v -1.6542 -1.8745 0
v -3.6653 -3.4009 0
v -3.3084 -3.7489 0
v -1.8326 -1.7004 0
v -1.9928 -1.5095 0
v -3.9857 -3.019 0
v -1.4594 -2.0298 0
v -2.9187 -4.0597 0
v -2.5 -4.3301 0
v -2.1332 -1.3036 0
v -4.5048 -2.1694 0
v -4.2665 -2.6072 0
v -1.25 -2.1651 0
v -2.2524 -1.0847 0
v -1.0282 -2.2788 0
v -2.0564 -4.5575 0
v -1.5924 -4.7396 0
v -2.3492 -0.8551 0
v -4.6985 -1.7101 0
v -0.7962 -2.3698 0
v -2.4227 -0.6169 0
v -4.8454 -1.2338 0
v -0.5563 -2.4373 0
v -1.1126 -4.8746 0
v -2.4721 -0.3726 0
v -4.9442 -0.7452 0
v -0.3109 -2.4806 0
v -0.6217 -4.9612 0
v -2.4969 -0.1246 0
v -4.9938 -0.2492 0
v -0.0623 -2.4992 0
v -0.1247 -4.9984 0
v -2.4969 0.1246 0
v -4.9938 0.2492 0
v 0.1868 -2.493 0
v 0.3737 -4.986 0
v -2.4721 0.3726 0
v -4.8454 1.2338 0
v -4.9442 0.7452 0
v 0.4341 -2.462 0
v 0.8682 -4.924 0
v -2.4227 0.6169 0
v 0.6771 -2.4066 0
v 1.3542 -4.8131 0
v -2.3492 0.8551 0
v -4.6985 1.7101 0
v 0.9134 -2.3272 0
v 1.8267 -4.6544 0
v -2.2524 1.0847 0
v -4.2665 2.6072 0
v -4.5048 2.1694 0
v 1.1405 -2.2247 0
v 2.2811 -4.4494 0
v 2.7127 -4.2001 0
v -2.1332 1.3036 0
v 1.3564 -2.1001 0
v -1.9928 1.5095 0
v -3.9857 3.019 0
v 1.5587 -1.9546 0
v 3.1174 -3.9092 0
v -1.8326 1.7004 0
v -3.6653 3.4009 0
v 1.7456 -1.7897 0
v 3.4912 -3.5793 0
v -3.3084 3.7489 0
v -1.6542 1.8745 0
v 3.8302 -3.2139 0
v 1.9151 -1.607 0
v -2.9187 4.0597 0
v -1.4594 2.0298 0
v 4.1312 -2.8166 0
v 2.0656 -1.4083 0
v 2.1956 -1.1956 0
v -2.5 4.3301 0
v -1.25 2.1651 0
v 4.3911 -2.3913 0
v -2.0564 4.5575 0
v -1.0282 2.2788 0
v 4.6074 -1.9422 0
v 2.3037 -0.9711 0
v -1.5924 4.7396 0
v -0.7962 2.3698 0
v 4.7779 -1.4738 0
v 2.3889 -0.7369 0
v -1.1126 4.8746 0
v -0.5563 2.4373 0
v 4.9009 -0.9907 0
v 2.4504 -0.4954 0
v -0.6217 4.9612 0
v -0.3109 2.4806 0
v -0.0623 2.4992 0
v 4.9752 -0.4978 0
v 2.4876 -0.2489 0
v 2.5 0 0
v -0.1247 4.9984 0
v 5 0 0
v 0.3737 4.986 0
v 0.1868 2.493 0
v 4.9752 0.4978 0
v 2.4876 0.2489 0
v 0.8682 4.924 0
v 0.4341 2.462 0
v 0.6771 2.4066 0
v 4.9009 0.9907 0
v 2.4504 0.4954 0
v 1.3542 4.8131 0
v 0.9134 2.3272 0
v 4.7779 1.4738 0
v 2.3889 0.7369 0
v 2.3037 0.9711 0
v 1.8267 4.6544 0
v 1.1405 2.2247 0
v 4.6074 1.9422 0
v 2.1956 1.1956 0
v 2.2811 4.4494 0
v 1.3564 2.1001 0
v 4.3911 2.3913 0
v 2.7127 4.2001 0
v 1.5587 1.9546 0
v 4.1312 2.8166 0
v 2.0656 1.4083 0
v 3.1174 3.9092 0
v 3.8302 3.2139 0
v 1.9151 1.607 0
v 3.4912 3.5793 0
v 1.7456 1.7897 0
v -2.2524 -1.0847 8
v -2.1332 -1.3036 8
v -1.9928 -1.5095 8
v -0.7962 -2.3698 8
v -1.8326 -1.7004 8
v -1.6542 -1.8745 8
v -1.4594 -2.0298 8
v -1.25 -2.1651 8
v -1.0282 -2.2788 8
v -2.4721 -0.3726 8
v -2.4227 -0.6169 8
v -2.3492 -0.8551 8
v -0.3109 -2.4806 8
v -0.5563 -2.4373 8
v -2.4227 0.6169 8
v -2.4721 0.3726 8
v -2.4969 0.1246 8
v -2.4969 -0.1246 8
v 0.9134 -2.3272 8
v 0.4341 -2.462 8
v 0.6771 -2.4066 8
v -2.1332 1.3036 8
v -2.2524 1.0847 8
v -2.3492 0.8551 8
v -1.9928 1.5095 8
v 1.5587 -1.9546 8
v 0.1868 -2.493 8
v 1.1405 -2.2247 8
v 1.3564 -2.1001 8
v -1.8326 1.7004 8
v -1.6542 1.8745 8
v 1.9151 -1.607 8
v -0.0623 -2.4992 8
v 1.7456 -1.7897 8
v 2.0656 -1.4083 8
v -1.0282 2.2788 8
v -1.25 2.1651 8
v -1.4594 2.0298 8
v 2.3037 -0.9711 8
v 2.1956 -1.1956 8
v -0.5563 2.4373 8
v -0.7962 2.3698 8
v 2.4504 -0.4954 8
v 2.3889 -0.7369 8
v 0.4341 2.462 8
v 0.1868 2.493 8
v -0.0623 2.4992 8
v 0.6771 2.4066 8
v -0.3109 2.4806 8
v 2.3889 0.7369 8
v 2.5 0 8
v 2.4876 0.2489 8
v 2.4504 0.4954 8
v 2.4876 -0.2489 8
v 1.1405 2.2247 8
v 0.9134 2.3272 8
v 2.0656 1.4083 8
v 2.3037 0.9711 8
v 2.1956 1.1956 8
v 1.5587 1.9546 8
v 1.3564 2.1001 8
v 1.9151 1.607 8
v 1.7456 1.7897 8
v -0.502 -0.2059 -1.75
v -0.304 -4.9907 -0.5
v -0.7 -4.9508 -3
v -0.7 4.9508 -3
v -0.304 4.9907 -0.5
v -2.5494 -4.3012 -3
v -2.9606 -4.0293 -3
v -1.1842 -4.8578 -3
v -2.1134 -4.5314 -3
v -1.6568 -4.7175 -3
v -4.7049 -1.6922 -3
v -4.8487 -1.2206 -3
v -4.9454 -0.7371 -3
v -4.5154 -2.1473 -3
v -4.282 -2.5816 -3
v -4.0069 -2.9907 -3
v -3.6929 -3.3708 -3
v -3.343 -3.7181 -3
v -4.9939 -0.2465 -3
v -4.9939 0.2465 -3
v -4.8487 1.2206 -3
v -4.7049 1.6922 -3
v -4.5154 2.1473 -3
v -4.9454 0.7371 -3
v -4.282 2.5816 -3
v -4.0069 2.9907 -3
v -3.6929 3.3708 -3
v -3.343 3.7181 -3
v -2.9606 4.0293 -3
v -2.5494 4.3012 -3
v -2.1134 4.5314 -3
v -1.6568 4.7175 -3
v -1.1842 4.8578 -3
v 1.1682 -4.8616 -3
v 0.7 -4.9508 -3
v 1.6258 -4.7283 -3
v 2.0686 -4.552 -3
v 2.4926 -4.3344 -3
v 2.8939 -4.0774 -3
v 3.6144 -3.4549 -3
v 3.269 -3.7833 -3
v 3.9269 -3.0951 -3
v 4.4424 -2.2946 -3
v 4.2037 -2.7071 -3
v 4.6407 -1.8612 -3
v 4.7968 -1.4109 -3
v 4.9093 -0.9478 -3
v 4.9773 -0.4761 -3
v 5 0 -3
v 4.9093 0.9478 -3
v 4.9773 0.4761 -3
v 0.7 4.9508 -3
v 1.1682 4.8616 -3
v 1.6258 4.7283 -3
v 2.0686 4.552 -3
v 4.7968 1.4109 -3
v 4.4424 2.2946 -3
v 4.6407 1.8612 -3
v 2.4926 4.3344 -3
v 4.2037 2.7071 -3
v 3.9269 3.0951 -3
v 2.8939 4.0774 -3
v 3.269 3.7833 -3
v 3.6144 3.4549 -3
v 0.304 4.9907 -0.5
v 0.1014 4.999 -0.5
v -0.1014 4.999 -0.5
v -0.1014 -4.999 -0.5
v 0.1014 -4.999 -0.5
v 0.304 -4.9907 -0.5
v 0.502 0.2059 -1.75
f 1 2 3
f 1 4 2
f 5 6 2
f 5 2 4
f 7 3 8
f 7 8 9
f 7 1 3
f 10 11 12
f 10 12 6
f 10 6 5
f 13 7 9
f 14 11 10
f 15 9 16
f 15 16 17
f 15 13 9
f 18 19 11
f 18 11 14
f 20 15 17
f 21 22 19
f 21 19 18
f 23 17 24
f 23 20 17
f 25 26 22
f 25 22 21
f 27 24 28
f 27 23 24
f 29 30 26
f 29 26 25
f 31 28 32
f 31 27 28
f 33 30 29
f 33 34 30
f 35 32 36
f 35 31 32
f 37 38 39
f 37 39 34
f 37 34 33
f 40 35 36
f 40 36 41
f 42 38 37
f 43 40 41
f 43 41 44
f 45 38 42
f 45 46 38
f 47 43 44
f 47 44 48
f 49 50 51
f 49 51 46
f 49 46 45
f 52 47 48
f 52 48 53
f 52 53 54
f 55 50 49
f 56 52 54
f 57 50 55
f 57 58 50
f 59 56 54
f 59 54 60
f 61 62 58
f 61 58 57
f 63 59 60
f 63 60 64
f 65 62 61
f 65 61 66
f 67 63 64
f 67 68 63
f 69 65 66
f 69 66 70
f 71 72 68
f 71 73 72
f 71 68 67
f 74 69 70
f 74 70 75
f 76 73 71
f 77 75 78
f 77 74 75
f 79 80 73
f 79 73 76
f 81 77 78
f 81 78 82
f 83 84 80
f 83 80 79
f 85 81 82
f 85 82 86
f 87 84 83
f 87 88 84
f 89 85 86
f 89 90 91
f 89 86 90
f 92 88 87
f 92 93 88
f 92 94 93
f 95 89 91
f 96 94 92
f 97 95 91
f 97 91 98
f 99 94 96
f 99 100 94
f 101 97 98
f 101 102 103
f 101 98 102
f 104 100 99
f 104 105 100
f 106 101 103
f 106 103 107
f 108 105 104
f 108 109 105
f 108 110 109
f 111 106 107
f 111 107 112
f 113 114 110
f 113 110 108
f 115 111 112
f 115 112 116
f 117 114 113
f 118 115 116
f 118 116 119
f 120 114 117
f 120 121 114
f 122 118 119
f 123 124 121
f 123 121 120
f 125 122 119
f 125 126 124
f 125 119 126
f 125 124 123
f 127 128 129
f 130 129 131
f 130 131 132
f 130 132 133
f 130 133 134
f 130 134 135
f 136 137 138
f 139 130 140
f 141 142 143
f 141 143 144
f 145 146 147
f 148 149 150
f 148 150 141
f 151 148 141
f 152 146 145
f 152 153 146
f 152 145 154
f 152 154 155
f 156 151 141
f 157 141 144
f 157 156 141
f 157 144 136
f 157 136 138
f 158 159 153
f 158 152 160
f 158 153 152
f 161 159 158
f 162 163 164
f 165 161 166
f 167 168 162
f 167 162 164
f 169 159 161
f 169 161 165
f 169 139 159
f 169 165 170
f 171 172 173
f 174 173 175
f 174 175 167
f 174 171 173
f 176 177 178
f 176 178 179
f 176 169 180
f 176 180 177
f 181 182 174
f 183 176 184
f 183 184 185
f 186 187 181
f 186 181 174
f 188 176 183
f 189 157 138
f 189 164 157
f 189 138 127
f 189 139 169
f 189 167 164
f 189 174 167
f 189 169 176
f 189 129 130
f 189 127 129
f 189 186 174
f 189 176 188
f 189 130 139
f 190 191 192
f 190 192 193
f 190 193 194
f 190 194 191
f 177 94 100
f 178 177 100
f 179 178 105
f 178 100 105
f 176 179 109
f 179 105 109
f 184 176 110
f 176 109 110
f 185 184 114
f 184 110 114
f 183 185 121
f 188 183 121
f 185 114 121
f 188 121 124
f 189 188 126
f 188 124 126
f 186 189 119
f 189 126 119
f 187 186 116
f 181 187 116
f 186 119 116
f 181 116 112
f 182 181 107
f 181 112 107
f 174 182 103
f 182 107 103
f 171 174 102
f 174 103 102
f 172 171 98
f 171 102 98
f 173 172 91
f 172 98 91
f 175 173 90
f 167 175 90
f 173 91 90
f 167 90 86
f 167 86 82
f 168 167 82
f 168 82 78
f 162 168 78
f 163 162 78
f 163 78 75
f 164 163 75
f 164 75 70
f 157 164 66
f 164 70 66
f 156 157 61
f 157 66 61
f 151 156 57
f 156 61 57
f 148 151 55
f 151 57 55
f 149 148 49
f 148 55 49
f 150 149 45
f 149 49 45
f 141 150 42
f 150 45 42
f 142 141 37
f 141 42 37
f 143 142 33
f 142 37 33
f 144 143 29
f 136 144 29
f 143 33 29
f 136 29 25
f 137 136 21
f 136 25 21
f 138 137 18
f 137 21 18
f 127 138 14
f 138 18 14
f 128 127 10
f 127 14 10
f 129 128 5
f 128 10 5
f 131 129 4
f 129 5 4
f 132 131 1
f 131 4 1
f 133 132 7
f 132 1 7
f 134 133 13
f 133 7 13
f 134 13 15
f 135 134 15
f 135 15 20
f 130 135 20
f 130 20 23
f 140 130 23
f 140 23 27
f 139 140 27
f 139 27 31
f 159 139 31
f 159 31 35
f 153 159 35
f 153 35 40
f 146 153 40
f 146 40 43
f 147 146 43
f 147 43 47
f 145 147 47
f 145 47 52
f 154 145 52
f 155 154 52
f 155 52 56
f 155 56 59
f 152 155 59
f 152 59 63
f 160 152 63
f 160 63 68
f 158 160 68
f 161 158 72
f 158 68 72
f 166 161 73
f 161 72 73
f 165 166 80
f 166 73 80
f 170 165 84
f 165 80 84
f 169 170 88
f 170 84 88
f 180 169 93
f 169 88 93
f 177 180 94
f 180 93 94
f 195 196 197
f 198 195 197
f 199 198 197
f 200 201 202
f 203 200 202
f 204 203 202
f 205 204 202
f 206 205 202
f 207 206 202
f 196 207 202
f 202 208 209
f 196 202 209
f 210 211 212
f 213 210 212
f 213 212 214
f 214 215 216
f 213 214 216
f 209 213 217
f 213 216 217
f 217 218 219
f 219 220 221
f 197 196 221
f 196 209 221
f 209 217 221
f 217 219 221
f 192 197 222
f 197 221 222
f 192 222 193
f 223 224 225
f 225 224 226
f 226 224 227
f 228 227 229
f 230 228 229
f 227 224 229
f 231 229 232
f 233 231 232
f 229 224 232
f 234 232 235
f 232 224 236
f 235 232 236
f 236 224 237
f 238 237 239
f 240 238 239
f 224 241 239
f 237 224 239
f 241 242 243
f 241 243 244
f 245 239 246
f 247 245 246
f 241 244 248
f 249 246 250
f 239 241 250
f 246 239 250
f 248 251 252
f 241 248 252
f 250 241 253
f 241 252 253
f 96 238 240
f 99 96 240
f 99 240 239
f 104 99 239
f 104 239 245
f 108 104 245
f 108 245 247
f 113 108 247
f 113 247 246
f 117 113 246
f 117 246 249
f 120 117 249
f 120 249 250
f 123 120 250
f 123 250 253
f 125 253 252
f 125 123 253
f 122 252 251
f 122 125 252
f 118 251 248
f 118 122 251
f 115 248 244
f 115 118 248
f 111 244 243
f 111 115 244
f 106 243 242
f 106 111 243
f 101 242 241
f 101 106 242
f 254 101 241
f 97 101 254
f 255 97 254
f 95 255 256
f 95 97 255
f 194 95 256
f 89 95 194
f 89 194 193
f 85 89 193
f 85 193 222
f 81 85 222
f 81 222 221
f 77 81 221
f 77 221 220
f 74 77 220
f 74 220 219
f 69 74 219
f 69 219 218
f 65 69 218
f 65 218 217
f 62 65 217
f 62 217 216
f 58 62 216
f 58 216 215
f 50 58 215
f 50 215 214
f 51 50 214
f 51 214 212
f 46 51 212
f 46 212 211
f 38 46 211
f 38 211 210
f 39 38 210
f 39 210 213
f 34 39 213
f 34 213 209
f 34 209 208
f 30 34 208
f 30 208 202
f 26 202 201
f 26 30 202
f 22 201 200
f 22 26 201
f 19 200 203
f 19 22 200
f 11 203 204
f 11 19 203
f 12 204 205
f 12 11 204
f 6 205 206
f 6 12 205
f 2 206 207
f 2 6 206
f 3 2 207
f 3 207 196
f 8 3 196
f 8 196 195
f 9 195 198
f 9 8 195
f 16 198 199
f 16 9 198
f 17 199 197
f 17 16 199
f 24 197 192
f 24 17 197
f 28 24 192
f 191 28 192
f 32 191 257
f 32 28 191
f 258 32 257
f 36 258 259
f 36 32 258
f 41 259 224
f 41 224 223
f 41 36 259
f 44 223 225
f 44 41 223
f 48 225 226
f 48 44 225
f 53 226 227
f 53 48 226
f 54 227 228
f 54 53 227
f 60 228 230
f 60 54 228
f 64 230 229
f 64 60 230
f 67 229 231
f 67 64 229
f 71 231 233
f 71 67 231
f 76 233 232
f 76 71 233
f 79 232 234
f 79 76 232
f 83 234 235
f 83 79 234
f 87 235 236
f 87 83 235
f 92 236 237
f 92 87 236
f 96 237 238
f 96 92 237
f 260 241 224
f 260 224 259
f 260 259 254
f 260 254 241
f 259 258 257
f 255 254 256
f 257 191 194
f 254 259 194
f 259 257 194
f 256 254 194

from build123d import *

# Parameters (mm, degrees)
CROQUIS1_R              = 2.5
SALIENTE_EXTRUIR1_DEPTH = 8
CROQUIS2_R              = 5
SALIENTE_EXTRUIR2_DEPTH = 3
CROQUIS3_W              = 1.4
CROQUIS3_H              = 11
CORTAR_EXTRUIR2_DEPTH   = 2.5
CORTAR_EXTRUIR2_TAPER   = 9


with BuildPart() as part:
    # Croquis1 → Saliente-Extruir1 (new body)
    with BuildSketch(Plane.XY):
        Circle(CROQUIS1_R)
    extrude(amount=SALIENTE_EXTRUIR1_DEPTH)

    # Croquis2 → Saliente-Extruir2 (add)
    with BuildSketch(Plane.XY):
        Circle(CROQUIS2_R)
    extrude(amount=-SALIENTE_EXTRUIR2_DEPTH)

    # Croquis3 → Cortar-Extruir2 (cut)
    with BuildSketch(Plane(origin=(0, 0, -3), x_dir=(-1, 0, 0), z_dir=(0, 0, -1))):
        Rectangle(CROQUIS3_W, CROQUIS3_H)
    extrude(amount=-CORTAR_EXTRUIR2_DEPTH, taper=CORTAR_EXTRUIR2_TAPER, mode=Mode.SUBTRACT)


solid = part.part
